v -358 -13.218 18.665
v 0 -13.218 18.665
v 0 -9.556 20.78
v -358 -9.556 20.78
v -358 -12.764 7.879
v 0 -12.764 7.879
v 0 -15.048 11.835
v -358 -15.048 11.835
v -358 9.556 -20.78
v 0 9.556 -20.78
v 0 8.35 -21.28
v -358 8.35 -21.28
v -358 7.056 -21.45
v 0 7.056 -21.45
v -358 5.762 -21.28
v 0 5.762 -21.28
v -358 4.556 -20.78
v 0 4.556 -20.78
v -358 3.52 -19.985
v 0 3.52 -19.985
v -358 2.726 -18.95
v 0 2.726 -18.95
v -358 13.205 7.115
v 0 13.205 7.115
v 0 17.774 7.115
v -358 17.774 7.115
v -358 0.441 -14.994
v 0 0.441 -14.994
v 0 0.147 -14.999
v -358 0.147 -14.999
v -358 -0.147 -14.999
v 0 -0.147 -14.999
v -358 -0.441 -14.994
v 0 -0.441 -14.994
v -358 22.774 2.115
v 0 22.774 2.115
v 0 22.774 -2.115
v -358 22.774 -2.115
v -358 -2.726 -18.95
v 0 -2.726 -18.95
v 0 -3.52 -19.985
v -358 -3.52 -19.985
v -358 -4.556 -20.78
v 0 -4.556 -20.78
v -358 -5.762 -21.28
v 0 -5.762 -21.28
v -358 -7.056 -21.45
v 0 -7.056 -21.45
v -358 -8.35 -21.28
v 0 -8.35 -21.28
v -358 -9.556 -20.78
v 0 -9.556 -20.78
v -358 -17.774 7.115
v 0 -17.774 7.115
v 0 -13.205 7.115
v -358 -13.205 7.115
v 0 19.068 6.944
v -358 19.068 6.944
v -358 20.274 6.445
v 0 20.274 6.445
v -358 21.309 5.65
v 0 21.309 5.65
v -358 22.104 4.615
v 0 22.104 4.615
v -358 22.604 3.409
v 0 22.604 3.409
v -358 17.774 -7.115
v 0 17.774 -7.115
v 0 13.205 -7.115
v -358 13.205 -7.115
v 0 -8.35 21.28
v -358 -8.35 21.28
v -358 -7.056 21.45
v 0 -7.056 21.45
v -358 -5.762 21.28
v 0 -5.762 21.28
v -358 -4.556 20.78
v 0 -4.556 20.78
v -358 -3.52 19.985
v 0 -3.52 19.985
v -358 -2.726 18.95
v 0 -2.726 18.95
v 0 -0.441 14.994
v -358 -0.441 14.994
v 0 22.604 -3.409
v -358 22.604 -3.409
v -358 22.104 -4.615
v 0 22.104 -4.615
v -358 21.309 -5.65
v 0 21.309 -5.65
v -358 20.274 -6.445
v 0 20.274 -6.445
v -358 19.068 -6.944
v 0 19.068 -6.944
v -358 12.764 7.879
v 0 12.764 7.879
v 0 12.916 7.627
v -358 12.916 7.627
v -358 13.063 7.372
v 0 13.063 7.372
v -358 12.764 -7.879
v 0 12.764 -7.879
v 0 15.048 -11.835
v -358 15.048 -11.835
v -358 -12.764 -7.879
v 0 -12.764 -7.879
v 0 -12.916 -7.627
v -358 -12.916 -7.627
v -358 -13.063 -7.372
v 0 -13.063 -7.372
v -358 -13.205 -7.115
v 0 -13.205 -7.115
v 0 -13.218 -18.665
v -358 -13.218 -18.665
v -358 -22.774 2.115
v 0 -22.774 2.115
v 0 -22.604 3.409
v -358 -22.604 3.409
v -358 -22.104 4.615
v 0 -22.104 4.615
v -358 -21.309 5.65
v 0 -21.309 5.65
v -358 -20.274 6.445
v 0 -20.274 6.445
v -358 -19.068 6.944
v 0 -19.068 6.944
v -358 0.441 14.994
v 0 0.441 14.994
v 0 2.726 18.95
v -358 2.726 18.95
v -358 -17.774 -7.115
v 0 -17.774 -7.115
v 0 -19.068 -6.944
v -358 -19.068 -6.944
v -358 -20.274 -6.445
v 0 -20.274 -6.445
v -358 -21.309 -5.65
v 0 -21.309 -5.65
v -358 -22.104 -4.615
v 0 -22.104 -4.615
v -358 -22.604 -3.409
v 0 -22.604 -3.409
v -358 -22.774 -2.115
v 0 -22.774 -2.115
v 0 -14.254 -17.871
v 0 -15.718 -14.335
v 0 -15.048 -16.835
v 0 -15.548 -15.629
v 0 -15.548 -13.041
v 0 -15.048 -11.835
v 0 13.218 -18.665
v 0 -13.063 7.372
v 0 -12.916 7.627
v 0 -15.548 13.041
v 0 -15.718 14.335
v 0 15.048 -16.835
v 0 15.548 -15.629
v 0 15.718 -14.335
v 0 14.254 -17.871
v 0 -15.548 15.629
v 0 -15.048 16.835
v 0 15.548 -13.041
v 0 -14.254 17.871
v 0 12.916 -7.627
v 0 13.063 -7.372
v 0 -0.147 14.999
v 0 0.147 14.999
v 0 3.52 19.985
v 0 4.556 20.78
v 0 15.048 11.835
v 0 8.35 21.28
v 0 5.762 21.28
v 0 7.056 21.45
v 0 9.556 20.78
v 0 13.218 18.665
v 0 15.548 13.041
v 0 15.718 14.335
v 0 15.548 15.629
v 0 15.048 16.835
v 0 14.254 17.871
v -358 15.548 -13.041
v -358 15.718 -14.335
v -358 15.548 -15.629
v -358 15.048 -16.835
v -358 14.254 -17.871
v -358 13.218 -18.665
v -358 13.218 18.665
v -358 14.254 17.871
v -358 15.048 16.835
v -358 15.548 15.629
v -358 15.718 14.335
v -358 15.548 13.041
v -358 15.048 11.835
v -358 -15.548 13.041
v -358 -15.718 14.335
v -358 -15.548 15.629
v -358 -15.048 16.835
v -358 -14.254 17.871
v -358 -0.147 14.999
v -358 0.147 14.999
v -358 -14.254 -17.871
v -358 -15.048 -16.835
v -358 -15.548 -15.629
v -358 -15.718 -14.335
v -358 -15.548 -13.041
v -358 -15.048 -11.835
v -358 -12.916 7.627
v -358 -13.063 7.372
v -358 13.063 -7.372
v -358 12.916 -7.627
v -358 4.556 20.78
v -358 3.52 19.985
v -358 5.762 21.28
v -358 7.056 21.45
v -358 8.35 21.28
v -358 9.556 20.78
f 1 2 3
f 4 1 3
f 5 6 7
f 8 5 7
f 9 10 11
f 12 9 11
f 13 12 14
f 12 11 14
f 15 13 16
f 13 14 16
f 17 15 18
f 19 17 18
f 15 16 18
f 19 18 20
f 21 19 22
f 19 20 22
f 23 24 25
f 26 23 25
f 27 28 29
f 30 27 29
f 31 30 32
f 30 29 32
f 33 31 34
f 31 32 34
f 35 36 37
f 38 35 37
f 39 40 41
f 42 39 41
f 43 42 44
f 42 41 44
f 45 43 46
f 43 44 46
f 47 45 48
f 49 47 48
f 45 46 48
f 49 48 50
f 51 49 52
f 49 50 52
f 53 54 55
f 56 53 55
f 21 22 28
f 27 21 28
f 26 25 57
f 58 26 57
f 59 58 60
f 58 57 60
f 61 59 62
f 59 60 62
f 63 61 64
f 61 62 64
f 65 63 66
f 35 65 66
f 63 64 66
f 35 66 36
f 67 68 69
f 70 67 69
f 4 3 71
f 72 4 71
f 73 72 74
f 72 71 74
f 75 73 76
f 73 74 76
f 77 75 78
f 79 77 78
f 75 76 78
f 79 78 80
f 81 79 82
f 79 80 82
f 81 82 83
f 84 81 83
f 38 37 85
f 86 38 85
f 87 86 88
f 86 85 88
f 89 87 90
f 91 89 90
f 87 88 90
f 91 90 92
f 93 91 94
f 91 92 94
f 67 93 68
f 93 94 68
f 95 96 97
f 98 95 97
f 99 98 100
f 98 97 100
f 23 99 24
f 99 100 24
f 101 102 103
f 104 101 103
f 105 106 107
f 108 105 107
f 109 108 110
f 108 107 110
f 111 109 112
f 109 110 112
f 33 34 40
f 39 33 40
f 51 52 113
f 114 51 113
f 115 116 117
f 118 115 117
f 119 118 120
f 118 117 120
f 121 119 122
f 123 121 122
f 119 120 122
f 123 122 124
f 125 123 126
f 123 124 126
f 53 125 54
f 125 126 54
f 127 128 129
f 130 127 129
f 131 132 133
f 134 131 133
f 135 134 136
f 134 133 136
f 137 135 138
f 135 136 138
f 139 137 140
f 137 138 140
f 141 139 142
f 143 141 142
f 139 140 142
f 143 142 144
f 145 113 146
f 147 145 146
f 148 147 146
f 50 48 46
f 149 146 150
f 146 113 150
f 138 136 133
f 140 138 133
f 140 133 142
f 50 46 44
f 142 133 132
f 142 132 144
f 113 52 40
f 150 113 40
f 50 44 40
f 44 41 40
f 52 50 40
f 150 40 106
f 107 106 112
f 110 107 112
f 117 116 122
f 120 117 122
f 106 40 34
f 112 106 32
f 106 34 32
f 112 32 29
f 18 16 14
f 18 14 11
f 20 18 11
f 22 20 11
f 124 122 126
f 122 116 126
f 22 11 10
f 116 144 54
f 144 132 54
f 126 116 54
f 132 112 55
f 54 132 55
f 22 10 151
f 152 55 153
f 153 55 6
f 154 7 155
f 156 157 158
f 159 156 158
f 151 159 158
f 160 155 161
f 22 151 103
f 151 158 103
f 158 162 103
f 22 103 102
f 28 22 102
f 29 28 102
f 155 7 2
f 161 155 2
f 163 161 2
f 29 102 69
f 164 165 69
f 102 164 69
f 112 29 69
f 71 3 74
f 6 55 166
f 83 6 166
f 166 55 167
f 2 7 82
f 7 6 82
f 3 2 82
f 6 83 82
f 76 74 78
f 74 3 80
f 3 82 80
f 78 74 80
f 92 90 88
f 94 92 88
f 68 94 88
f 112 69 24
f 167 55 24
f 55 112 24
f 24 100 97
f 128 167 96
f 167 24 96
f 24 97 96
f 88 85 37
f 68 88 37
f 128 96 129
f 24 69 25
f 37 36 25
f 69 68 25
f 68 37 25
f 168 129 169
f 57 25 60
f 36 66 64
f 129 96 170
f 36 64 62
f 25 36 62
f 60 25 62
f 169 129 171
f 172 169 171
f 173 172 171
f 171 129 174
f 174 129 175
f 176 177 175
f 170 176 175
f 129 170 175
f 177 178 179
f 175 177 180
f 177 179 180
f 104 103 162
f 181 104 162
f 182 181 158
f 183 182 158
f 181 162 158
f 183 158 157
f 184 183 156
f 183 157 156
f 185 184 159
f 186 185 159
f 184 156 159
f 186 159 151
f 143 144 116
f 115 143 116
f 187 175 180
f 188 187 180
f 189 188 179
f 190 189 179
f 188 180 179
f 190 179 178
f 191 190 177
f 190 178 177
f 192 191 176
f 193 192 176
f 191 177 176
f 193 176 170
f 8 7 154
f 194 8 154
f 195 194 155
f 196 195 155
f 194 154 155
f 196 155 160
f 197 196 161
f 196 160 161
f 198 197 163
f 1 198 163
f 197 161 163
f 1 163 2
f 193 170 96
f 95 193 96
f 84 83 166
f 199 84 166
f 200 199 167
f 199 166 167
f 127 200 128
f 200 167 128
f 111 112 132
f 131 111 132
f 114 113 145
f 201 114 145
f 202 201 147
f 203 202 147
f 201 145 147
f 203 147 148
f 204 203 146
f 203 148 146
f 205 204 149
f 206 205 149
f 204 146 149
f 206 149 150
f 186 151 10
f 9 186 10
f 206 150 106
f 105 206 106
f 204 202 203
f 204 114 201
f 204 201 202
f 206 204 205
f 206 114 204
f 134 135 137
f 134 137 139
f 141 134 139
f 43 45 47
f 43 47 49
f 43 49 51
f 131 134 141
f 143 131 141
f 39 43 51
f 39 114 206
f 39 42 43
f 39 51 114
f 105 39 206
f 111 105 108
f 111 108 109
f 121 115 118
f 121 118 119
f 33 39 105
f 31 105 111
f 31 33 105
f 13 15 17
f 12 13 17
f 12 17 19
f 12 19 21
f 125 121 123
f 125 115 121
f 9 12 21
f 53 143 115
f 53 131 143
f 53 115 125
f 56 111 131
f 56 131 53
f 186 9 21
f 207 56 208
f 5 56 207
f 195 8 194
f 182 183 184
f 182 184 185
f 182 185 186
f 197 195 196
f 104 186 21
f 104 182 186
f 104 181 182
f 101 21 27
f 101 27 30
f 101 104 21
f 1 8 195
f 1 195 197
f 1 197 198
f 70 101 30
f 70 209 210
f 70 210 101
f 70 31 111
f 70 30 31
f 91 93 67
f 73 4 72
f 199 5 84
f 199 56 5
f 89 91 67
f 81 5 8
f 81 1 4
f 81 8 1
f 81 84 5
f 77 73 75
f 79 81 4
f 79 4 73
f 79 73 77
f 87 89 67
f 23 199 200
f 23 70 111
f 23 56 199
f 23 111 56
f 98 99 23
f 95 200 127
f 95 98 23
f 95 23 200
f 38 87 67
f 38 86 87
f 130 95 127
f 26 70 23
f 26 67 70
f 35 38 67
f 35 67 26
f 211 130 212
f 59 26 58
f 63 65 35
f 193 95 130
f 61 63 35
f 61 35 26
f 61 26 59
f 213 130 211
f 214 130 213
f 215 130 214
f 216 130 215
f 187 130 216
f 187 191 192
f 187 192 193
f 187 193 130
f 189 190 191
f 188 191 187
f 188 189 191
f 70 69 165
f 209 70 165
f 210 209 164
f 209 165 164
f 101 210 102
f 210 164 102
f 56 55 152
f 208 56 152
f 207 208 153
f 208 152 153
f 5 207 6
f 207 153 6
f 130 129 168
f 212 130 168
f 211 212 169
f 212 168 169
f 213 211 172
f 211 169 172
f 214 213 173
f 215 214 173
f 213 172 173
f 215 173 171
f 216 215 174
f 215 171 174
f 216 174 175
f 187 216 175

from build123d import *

# Parameters (mm, degrees)
SKETCH2_R            = 25.79
BOSS_EXTRUDE2_DEPTH  = 358
BOSS_EXTRUDE10_DEPTH = 358
SKETCH18_R           = 25.79
CUT_EXTRUDE5_DEPTH   = 358


with BuildPart() as part:
    # Sketch2 → Boss-Extrude2 (new body)
    with BuildSketch(Plane(origin=(0, 0, 0), x_dir=(0, 0, -1), z_dir=(1, 0, 0))):
        with Locations(Location((0, 0, 0), (0, 0, 180))):
            Circle(SKETCH2_R)
        with BuildLine():
            Line((9.521706212, 3.055668636), (16.449909442, 7.055668636))
            Line((16.449909442, 7.055668636), (14.335343, 10.718205149))
            Line((14.335343, 10.718205149), (7.40713977, 6.718205149))
            ThreePointArc((7.40713977, 6.718205149), (5, 8.660254038), (2.114566442, 9.773873785))
            Line((2.114566442, 9.773873785), (2.114566442, 17.773873785))
            Line((2.114566442, 17.773873785), (-2.114566442, 17.773873785))
            Line((-2.114566442, 17.773873785), (-2.114566442, 9.773873785))
            ThreePointArc((-2.114566442, 9.773873785), (-5, 8.660254038), (-7.40713977, 6.718205149))
            Line((-7.40713977, 6.718205149), (-14.335343, 10.718205149))
            Line((-14.335343, 10.718205149), (-16.449909442, 7.055668636))
            Line((-16.449909442, 7.055668636), (-9.521706212, 3.055668636))
            ThreePointArc((-9.521706212, 3.055668636), (-10, 0), (-9.521706212, -3.055668636))
            Line((-9.521706212, -3.055668636), (-16.449909442, -7.055668636))
            Line((-16.449909442, -7.055668636), (-14.335343, -10.718205149))
            Line((-14.335343, -10.718205149), (-7.40713977, -6.718205149))
            ThreePointArc((-7.40713977, -6.718205149), (-5, -8.660254038), (-2.114566442, -9.773873785))
            Line((-2.114566442, -9.773873785), (-2.114566442, -17.773873785))
            Line((-2.114566442, -17.773873785), (2.114566442, -17.773873785))
            Line((2.114566442, -17.773873785), (2.114566442, -9.773873785))
            ThreePointArc((2.114566442, -9.773873785), (5, -8.660254038), (7.40713977, -6.718205149))
            Line((7.40713977, -6.718205149), (14.335343, -10.718205149))
            Line((14.335343, -10.718205149), (16.449909442, -7.055668636))
            Line((16.449909442, -7.055668636), (9.521706212, -3.055668636))
            ThreePointArc((9.521706212, -3.055668636), (10, 0), (9.521706212, 3.055668636))
        make_face(mode=Mode.SUBTRACT)
    extrude(amount=BOSS_EXTRUDE2_DEPTH)

    # Sketch10 → Boss-Extrude10 (add)
    with BuildSketch(Plane.ZY):
        with BuildLine():
            Line((-7.114566442, -13.205413448), (-7.114566442, -17.773873785))
            ThreePointArc((-7.114566442, -17.773873785), (-5.650100348, -21.309407691), (-2.114566442, -22.773873785))
            Line((-2.114566442, -22.773873785), (2.114566442, -22.773873785))
            ThreePointArc((2.114566442, -22.773873785), (5.650100348, -21.309407691), (7.114566442, -17.773873785))
            Line((7.114566442, -17.773873785), (7.114566442, -13.205413448))
            ThreePointArc((7.114566442, -13.205413448), (7.5, -12.990381057), (7.878940293, -12.764102))
            Line((7.878940293, -12.764102), (11.835343, -15.048332168))
            ThreePointArc((11.835343, -15.048332168), (15.629438226, -15.547834281), (18.665470019, -13.218205149))
            Line((18.665470019, -13.218205149), (20.780036461, -9.555668636))
            ThreePointArc((20.780036461, -9.555668636), (21.279538574, -5.76157341), (18.949909442, -2.725541617))
            Line((18.949909442, -2.725541617), (14.993506735, -0.441311448))
            ThreePointArc((14.993506735, -0.441311448), (15, 0), (14.993506735, 0.441311448))
            Line((14.993506735, 0.441311448), (18.949909442, 2.725541617))
            ThreePointArc((18.949909442, 2.725541617), (21.279538574, 5.76157341), (20.780036461, 9.555668636))
            Line((20.780036461, 9.555668636), (18.665470019, 13.218205149))
            ThreePointArc((18.665470019, 13.218205149), (15.629438226, 15.547834281), (11.835343, 15.048332168))
            Line((11.835343, 15.048332168), (7.878940293, 12.764102))
            ThreePointArc((7.878940293, 12.764102), (7.5, 12.990381057), (7.114566442, 13.205413448))
            Line((7.114566442, 13.205413448), (7.114566442, 17.773873785))
            ThreePointArc((7.114566442, 17.773873785), (5.650100348, 21.309407691), (2.114566442, 22.773873785))
            Line((2.114566442, 22.773873785), (-2.114566442, 22.773873785))
            ThreePointArc((-2.114566442, 22.773873785), (-5.650100348, 21.309407691), (-7.114566442, 17.773873785))
            Line((-7.114566442, 17.773873785), (-7.114566442, 13.205413448))
            ThreePointArc((-7.114566442, 13.205413448), (-7.5, 12.990381057), (-7.878940293, 12.764102))
            Line((-7.878940293, 12.764102), (-11.835343, 15.048332168))
            ThreePointArc((-11.835343, 15.048332168), (-15.629438226, 15.547834281), (-18.665470019, 13.218205149))
            Line((-18.665470019, 13.218205149), (-20.780036461, 9.555668636))
            ThreePointArc((-20.780036461, 9.555668636), (-21.279538574, 5.76157341), (-18.949909442, 2.725541617))
            Line((-18.949909442, 2.725541617), (-14.993506735, 0.441311448))
            ThreePointArc((-14.993506735, 0.441311448), (-15, 0), (-14.993506735, -0.441311448))
            Line((-14.993506735, -0.441311448), (-18.949909442, -2.725541617))
            ThreePointArc((-18.949909442, -2.725541617), (-21.279538574, -5.76157341), (-20.780036461, -9.555668636))
            Line((-20.780036461, -9.555668636), (-18.665470019, -13.218205149))
            ThreePointArc((-18.665470019, -13.218205149), (-15.629438226, -15.547834281), (-11.835343, -15.048332168))
            Line((-11.835343, -15.048332168), (-7.878940293, -12.764102))
            ThreePointArc((-7.878940293, -12.764102), (-7.5, -12.990381057), (-7.114566442, -13.205413448))
        make_face()
    extrude(amount=BOSS_EXTRUDE10_DEPTH)

    # Sketch18 → Cut-Extrude5 (cut)
    with BuildSketch(Plane.ZY):
        Circle(SKETCH18_R)
    extrude(amount=-CUT_EXTRUDE5_DEPTH, mode=Mode.SUBTRACT)


solid = part.part
